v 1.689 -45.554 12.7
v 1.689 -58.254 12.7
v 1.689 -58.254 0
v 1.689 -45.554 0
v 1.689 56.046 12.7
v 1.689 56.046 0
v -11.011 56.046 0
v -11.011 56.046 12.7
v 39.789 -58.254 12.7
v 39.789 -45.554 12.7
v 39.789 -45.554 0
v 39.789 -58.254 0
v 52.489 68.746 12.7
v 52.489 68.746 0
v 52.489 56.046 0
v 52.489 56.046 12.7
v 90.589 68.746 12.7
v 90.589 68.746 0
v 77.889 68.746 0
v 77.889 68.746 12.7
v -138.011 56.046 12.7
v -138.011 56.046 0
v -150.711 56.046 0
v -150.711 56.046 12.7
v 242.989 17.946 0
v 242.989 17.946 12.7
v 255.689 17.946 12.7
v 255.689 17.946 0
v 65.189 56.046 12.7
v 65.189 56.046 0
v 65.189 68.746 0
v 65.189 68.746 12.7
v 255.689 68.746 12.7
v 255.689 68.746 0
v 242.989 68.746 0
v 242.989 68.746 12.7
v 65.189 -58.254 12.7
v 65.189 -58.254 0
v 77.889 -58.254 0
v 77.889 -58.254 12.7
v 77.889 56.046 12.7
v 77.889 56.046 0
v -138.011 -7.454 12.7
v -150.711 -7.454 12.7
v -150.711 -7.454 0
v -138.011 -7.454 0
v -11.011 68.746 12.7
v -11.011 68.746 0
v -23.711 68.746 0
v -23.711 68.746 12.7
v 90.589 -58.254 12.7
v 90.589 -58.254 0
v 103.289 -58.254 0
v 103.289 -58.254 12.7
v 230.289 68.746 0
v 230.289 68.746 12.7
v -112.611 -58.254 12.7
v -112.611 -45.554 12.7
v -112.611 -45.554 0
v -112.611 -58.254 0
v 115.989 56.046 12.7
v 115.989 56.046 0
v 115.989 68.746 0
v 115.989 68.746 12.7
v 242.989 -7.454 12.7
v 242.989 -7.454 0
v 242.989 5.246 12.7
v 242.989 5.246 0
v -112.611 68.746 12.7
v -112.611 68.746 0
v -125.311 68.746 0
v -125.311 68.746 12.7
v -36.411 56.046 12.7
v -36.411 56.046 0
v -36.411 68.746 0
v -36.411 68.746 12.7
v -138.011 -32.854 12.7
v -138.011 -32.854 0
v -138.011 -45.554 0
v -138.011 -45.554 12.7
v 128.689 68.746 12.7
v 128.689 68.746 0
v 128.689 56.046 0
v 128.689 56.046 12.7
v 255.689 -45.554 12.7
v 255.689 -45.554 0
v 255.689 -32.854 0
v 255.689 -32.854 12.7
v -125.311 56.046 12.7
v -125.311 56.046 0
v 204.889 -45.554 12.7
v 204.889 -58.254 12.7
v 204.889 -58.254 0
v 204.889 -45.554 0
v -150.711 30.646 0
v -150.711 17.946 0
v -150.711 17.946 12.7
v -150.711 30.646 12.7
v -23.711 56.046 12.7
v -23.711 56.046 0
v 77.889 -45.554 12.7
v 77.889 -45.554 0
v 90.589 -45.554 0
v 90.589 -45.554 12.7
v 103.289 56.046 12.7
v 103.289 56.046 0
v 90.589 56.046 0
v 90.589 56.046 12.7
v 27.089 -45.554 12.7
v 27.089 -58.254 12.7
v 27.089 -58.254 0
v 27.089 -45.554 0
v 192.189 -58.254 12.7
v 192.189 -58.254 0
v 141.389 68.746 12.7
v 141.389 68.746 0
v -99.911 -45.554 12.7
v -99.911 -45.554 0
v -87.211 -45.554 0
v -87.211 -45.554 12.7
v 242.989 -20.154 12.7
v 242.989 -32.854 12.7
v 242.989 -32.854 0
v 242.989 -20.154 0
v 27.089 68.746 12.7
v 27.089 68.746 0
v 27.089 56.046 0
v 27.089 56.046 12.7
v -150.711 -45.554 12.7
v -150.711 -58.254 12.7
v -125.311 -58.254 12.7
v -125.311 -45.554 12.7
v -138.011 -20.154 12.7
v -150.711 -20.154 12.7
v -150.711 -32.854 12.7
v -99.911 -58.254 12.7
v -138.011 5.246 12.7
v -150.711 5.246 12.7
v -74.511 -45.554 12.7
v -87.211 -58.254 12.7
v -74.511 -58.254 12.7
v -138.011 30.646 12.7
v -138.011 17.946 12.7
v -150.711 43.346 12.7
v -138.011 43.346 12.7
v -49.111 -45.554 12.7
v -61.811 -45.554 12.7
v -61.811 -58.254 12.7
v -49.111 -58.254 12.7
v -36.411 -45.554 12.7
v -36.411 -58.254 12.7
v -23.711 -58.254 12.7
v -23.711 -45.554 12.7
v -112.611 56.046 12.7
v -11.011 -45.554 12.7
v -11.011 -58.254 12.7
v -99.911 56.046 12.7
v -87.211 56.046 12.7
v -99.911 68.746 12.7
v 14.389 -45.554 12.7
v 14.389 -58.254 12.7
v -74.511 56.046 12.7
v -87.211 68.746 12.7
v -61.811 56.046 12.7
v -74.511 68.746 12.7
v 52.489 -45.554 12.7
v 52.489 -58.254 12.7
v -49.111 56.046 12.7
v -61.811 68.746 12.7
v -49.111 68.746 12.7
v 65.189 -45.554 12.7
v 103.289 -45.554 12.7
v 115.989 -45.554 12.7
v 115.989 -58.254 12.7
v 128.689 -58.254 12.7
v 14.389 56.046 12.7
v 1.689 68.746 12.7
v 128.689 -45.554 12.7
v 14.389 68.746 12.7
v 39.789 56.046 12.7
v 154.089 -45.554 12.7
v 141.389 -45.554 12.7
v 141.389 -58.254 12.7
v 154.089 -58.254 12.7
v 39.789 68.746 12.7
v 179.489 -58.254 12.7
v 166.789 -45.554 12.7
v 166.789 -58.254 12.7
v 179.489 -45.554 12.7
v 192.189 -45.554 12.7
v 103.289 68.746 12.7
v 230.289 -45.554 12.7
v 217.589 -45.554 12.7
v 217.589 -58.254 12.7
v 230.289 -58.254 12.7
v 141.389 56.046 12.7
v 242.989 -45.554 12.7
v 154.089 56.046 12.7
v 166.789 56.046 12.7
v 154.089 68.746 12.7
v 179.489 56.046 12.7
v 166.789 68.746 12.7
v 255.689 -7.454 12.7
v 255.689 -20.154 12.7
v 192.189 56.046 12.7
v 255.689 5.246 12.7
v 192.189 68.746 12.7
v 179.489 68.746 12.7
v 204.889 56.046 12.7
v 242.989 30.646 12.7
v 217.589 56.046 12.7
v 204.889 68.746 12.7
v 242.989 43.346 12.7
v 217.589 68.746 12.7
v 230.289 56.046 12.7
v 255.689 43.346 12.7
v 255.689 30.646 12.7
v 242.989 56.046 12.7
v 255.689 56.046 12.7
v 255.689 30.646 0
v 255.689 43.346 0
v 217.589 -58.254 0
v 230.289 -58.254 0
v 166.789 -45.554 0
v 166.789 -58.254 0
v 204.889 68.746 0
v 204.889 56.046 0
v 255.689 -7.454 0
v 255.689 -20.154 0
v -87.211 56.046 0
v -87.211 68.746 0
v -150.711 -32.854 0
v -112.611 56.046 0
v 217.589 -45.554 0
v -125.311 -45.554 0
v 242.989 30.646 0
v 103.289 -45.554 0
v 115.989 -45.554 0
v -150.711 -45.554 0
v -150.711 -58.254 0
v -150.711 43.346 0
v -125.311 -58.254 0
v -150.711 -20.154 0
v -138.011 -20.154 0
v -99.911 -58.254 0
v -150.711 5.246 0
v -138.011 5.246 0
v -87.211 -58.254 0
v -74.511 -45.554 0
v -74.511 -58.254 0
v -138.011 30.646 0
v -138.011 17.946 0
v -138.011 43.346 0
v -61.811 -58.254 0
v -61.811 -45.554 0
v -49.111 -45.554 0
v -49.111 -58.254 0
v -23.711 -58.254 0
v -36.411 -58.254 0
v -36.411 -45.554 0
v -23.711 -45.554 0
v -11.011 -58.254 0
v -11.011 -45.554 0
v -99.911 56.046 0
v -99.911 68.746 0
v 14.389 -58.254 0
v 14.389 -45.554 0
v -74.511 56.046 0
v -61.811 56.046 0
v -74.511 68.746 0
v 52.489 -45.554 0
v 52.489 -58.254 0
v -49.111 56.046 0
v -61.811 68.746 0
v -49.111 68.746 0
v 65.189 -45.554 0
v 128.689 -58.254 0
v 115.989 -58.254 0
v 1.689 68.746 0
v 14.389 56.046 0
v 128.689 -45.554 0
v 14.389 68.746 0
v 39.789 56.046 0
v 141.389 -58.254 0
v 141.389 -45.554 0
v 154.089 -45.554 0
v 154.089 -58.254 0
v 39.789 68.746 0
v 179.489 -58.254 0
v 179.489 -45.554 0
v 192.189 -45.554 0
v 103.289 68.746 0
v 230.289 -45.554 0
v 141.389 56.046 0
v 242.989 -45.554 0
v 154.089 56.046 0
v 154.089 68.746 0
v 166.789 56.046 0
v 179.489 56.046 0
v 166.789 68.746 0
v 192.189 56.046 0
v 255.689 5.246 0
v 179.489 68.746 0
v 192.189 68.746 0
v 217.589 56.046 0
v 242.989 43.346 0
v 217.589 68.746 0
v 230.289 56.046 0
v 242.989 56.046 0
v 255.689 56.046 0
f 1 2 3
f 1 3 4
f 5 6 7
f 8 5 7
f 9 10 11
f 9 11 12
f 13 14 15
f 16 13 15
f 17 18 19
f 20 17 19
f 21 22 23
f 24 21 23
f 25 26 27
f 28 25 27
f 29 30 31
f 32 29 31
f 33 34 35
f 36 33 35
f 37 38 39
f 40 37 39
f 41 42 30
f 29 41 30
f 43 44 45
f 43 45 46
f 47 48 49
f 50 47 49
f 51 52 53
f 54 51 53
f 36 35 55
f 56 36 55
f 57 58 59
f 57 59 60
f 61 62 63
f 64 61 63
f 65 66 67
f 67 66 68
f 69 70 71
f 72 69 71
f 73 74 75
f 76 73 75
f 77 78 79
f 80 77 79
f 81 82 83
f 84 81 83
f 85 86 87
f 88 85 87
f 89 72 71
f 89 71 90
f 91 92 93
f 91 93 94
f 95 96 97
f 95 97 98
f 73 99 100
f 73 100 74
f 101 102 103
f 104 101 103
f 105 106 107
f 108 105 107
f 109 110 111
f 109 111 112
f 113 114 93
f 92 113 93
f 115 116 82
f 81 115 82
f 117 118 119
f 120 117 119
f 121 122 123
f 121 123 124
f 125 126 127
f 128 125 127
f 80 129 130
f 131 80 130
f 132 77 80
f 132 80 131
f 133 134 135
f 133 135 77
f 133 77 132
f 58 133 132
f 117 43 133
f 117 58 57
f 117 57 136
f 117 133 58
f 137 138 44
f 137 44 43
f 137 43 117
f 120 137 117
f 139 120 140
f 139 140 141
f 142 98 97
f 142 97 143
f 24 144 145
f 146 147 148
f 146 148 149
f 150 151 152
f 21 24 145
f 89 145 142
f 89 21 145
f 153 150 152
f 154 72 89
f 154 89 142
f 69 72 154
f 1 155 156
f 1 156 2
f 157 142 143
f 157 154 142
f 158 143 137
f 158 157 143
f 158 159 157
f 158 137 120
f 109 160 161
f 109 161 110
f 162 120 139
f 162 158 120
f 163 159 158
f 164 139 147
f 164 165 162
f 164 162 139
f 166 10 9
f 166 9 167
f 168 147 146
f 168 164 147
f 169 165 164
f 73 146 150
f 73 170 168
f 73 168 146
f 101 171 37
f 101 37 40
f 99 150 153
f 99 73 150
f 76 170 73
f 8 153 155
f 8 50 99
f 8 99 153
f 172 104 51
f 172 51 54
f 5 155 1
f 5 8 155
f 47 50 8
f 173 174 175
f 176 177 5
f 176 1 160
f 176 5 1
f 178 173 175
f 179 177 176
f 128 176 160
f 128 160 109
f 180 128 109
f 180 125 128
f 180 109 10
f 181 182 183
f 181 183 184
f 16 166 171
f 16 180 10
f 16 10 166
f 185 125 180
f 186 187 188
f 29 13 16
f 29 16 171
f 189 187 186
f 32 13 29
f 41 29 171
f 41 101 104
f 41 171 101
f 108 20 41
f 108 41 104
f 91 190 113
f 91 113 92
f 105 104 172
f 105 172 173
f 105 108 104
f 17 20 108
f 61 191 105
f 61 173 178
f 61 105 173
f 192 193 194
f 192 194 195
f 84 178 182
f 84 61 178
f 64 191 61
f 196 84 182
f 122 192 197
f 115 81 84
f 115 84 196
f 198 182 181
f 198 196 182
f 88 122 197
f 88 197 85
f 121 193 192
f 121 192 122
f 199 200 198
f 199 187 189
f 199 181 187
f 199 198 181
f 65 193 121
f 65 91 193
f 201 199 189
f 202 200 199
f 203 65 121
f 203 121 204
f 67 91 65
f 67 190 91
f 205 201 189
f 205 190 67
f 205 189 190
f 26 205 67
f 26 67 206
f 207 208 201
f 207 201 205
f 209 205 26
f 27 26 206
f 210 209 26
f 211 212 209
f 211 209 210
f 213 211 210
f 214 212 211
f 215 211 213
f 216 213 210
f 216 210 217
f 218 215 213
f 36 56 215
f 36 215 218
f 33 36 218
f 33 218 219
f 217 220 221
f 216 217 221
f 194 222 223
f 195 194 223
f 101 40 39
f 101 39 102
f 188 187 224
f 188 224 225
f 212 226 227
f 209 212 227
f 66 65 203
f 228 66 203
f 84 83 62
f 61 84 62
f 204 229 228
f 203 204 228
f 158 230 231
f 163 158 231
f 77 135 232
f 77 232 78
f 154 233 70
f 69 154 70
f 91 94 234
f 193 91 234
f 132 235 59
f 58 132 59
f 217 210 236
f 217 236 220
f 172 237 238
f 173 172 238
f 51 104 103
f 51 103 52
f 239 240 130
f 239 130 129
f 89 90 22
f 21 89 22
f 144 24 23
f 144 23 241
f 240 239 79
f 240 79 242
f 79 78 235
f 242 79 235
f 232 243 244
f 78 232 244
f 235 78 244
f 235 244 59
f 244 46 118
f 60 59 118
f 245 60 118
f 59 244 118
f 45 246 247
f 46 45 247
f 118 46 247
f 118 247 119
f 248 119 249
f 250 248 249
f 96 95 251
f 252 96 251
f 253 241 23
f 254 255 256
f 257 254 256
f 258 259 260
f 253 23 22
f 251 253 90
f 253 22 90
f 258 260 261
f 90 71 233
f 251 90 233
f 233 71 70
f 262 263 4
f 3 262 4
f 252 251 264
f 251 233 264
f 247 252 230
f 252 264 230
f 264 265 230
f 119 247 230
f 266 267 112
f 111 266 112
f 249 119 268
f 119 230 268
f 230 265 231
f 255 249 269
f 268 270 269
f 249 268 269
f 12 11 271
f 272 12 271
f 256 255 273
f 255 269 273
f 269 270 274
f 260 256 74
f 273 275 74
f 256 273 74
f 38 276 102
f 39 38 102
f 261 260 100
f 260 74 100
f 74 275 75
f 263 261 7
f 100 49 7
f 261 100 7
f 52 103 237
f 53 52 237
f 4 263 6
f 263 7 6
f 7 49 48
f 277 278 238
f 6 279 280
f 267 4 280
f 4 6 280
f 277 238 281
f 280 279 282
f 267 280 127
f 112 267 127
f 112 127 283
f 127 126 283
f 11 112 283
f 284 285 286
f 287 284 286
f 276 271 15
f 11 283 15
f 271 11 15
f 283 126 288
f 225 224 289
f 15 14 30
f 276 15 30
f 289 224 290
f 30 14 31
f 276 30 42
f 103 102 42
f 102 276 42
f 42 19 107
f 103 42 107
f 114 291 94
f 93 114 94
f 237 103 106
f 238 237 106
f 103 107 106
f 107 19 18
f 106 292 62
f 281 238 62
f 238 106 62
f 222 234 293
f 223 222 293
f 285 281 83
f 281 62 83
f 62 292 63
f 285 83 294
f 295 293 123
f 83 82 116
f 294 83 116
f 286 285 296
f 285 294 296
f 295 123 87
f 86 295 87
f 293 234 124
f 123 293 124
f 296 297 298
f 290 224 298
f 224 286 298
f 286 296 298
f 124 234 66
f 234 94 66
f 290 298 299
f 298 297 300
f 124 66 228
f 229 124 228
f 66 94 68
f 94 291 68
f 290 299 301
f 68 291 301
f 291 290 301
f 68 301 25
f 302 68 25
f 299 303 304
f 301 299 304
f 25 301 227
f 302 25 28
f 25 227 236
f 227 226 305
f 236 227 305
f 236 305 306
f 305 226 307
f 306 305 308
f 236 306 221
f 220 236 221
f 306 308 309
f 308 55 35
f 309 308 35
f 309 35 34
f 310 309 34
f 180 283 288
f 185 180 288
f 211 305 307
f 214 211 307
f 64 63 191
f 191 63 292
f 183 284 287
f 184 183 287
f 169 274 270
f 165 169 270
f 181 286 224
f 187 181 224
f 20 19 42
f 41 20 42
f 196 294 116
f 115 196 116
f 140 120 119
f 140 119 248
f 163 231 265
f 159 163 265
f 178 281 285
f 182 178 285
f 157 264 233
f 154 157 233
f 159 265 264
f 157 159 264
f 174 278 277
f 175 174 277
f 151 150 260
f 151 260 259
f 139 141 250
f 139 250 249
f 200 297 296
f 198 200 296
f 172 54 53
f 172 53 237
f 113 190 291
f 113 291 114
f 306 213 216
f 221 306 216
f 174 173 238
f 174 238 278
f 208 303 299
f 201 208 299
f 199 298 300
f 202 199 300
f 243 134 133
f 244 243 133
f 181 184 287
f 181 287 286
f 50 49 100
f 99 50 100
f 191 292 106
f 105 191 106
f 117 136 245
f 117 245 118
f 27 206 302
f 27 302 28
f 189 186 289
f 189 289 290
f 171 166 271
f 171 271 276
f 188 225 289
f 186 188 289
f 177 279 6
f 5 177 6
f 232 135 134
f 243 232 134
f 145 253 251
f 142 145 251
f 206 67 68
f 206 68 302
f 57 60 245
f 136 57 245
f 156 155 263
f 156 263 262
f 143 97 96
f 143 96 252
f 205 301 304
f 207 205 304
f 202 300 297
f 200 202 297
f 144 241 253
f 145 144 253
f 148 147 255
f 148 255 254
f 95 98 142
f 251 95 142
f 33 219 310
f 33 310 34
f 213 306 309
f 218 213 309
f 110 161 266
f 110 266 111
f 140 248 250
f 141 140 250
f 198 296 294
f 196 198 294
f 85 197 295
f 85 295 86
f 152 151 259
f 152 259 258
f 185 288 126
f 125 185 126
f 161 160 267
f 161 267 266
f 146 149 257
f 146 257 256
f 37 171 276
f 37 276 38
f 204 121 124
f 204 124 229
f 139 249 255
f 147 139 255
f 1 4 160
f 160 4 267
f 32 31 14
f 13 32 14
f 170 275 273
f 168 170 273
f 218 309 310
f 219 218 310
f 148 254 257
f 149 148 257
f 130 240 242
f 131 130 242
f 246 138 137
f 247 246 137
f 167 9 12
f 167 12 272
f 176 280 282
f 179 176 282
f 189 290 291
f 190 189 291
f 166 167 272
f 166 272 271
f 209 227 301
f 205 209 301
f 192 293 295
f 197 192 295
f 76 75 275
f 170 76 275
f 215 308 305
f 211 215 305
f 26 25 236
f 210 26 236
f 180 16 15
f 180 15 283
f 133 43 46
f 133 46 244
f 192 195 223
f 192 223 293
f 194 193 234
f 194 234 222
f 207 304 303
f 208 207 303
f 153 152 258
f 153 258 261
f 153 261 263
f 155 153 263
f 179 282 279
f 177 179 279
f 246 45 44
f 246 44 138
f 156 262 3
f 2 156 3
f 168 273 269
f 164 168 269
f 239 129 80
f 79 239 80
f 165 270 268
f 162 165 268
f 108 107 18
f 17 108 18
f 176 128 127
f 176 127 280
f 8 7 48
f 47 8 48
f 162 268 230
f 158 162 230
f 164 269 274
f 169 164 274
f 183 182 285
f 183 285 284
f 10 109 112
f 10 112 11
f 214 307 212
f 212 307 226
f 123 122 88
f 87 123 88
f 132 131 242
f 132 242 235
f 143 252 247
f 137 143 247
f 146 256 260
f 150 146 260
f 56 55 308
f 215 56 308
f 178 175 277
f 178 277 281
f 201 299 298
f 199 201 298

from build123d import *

# Parameters (mm, degrees)
F0_W     = 12.7
F0_H     = 12.7
F1_DEPTH = 12.7


# Not quite as in the source:
# - ends of sketch curves that miss each other by under 0.0002 mm in the source are joined
# - a feature names something its author has since deleted; it is built from what else it names


with BuildPart() as f1:
    # F0 (on Top) → F1 (new body)
    with BuildSketch(Plane.XY):
        Polygon((-112.6111072004, 68.7462910332), (-125.3111072004, 68.7462910332), (-125.3111072004, 56.0462910332), (-138.0111072004, 56.0462921858), (-138.0111072004, 43.3462910332), (-138.0111072004, 30.6462910332), (-138.0111072004, 17.9462910332), (-138.0111072004, 5.2462910332), (-138.0111072004, -7.4537089668), (-138.0111072004, -20.1537089668), (-138.0111072004, -32.8537089668), (-138.0111072004, -45.5537089668), (-138.0111072004, -58.2537089668), (-125.3111072004, -58.2537089668), (-125.3111072004, -45.5537089668), (-112.6111072004, -45.5537089668), (-112.6111072004, -58.2537089668), (-99.9111072004, -58.2537089668), (-99.9111072004, -45.5537089668), (-87.2111072004, -45.5537089668), (-87.2111072004, -58.2537089668), (-74.5111072004, -58.2537089668), (-74.5111072004, -45.5537089668), (-61.8111072004, -45.5537089668), (-61.8111072004, -58.2537089668), (-49.1111072004, -58.2537089668), (-49.1111072004, -45.5537089668), (-36.4111072004, -45.5537089668), (-36.4111072004, -58.2537089668), (-23.7111072004, -58.2537089668), (-23.7111072004, -45.5537089668), (-11.0111072004, -45.5537089668), (-11.0111072004, -58.2537089668), (1.6888927996, -58.2537089668), (1.6888927996, -45.5537089668), (14.3888927996, -45.5537089668), (14.3888927996, -58.2537089668), (27.0888927996, -58.2537089668), (27.0888927996, -45.5537089668), (39.7888927996, -45.5537089668), (39.7888927996, -58.2537089668), (52.4888927996, -58.2537089668), (52.4888927996, -45.5537089668), (65.1888927996, -45.5537089668), (65.1888927996, -58.2537089668), (77.8888927996, -58.2537089668), (77.8888927996, -45.5537089668), (90.5888927996, -45.5537089668), (90.5888927996, -58.2537089668), (103.2888927996, -58.2537089668), (103.2888927996, -45.5537089668), (115.9888927996, -45.5537089668), (115.9888927996, -58.2537089668), (128.6888927996, -58.2537089668), (128.6888927996, -45.5537089668), (141.3888927996, -45.5537089668), (141.3888927996, -58.2537089668), (154.0888927996, -58.2537089668), (154.0888927996, -45.5537089668), (166.7888927996, -45.5537089668), (166.7888927996, -58.2537089668), (179.4888927996, -58.2537089668), (179.4888927996, -45.5537089668), (192.1888927996, -45.5537089668), (192.1888927996, -58.2537089668), (204.8888927996, -58.2537089668), (204.8888927996, -45.5537089668), (217.5888927996, -45.5537089668), (217.5888927996, -58.2537089668), (230.2888927996, -58.2537089668), (230.2888927996, -45.5537089668), (242.9888927996, -45.5537089668), (242.9888927996, -32.8537103117), (242.9888927996, -20.1537098634), (242.9888927996, -7.4537103117), (242.9888927996, 5.2462896883), (242.9888927996, 17.9462896883), (242.9888927996, 30.6462901366), (242.9888927996, 43.3462896883), (242.9888927996, 56.0462905208), (242.9888927996, 68.7462910332), (230.2888927996, 68.7462910332), (230.2888927996, 56.0462921858), (217.5888927996, 56.0462921858), (217.5888927996, 68.7462921858), (204.8888927996, 68.7462910332), (204.8888927996, 56.0462921858), (192.1888927996, 56.0462921858), (192.1888927996, 68.7462910332), (179.4888927996, 68.7462910332), (179.4888927996, 56.0462921858), (166.7888927996, 56.0462921858), (166.7888927996, 68.7462921858), (154.0888927996, 68.7462910332), (154.0888927996, 56.0462921858), (141.3888927996, 56.0462921858), (141.3888927996, 68.7462910332), (128.6888927996, 68.7462910332), (128.6888927996, 56.0462921858), (115.9888927996, 56.0462921858), (115.9888927996, 68.7462921858), (103.2888927996, 68.7462910332), (103.2888927996, 56.0462921858), (90.5888927996, 56.0462921858), (90.5888927996, 68.7462921858), (77.8888927996, 68.7462910332), (77.8888927996, 56.0462921858), (65.1888927996, 56.0462921858), (65.1888927996, 68.7462921858), (52.4888927996, 68.7462910332), (52.4888927996, 56.0462921858), (39.7888927996, 56.0462921858), (39.7888927996, 68.7462921858), (27.0888927996, 68.7462910332), (27.0888927996, 56.0462921858), (14.3888927996, 56.0462921858), (14.3888927996, 68.7462921858), (1.6888927996, 68.7462910332), (1.6888927996, 56.0462921858), (-11.0111072004, 56.0462921858), (-11.0111072004, 68.7462921858), (-23.7111072004, 68.7462910332), (-23.7111072004, 56.0462921858), (-36.4111072004, 56.0462921858), (-36.4111072004, 68.7462921858), (-49.1111072004, 68.7462910332), (-49.1111072004, 56.0462921858), (-61.8111072004, 56.0462921858), (-61.8111072004, 68.7462921858), (-74.5111072004, 68.7462910332), (-74.5111072004, 56.0462921858), (-87.2111072004, 56.0462921858), (-87.2111072004, 68.7462921858), (-99.9111072004, 68.7462910332), (-99.9111072004, 56.0462921858), (-112.6111072004, 56.0462921858), align=None)
        with Locations((-144.3611072004, -51.9037089668)):
            Rectangle(F0_W, F0_H)
        Polygon((-138.0111072004, 43.3462910332), (-138.0111072004, 56.0462916095), (-150.7111072004, 56.0462910332), (-150.7111072004, 43.3462910332), align=None)
        with Locations((-144.3611072004, 24.2962910332)):
            Rectangle(F0_W, F0_H)
        with Locations((-144.3611072004, -1.1037089668)):
            Rectangle(F0_W, F0_H)
        with Locations((-144.3611072004, -26.5037089668)):
            Rectangle(F0_W, F0_H)
        with Locations((249.3388927996, -39.2037103117)):
            Rectangle(F0_W, F0_H)
        with Locations((249.3388927996, -13.8037103117)):
            Rectangle(F0_W, F0_H)
        with Locations((249.3388927996, 11.5962896883)):
            Rectangle(F0_W, F0_H)
        with Locations((249.3388927996, 36.9962896883)):
            Rectangle(F0_W, F0_H)
        Polygon((255.6888927996, 68.7462896883), (242.9888927996, 68.7462896883), (242.9888927996, 56.0462905208), (255.6888927996, 56.0462896883), align=None)
    extrude(amount=F1_DEPTH)


solid = f1.part
